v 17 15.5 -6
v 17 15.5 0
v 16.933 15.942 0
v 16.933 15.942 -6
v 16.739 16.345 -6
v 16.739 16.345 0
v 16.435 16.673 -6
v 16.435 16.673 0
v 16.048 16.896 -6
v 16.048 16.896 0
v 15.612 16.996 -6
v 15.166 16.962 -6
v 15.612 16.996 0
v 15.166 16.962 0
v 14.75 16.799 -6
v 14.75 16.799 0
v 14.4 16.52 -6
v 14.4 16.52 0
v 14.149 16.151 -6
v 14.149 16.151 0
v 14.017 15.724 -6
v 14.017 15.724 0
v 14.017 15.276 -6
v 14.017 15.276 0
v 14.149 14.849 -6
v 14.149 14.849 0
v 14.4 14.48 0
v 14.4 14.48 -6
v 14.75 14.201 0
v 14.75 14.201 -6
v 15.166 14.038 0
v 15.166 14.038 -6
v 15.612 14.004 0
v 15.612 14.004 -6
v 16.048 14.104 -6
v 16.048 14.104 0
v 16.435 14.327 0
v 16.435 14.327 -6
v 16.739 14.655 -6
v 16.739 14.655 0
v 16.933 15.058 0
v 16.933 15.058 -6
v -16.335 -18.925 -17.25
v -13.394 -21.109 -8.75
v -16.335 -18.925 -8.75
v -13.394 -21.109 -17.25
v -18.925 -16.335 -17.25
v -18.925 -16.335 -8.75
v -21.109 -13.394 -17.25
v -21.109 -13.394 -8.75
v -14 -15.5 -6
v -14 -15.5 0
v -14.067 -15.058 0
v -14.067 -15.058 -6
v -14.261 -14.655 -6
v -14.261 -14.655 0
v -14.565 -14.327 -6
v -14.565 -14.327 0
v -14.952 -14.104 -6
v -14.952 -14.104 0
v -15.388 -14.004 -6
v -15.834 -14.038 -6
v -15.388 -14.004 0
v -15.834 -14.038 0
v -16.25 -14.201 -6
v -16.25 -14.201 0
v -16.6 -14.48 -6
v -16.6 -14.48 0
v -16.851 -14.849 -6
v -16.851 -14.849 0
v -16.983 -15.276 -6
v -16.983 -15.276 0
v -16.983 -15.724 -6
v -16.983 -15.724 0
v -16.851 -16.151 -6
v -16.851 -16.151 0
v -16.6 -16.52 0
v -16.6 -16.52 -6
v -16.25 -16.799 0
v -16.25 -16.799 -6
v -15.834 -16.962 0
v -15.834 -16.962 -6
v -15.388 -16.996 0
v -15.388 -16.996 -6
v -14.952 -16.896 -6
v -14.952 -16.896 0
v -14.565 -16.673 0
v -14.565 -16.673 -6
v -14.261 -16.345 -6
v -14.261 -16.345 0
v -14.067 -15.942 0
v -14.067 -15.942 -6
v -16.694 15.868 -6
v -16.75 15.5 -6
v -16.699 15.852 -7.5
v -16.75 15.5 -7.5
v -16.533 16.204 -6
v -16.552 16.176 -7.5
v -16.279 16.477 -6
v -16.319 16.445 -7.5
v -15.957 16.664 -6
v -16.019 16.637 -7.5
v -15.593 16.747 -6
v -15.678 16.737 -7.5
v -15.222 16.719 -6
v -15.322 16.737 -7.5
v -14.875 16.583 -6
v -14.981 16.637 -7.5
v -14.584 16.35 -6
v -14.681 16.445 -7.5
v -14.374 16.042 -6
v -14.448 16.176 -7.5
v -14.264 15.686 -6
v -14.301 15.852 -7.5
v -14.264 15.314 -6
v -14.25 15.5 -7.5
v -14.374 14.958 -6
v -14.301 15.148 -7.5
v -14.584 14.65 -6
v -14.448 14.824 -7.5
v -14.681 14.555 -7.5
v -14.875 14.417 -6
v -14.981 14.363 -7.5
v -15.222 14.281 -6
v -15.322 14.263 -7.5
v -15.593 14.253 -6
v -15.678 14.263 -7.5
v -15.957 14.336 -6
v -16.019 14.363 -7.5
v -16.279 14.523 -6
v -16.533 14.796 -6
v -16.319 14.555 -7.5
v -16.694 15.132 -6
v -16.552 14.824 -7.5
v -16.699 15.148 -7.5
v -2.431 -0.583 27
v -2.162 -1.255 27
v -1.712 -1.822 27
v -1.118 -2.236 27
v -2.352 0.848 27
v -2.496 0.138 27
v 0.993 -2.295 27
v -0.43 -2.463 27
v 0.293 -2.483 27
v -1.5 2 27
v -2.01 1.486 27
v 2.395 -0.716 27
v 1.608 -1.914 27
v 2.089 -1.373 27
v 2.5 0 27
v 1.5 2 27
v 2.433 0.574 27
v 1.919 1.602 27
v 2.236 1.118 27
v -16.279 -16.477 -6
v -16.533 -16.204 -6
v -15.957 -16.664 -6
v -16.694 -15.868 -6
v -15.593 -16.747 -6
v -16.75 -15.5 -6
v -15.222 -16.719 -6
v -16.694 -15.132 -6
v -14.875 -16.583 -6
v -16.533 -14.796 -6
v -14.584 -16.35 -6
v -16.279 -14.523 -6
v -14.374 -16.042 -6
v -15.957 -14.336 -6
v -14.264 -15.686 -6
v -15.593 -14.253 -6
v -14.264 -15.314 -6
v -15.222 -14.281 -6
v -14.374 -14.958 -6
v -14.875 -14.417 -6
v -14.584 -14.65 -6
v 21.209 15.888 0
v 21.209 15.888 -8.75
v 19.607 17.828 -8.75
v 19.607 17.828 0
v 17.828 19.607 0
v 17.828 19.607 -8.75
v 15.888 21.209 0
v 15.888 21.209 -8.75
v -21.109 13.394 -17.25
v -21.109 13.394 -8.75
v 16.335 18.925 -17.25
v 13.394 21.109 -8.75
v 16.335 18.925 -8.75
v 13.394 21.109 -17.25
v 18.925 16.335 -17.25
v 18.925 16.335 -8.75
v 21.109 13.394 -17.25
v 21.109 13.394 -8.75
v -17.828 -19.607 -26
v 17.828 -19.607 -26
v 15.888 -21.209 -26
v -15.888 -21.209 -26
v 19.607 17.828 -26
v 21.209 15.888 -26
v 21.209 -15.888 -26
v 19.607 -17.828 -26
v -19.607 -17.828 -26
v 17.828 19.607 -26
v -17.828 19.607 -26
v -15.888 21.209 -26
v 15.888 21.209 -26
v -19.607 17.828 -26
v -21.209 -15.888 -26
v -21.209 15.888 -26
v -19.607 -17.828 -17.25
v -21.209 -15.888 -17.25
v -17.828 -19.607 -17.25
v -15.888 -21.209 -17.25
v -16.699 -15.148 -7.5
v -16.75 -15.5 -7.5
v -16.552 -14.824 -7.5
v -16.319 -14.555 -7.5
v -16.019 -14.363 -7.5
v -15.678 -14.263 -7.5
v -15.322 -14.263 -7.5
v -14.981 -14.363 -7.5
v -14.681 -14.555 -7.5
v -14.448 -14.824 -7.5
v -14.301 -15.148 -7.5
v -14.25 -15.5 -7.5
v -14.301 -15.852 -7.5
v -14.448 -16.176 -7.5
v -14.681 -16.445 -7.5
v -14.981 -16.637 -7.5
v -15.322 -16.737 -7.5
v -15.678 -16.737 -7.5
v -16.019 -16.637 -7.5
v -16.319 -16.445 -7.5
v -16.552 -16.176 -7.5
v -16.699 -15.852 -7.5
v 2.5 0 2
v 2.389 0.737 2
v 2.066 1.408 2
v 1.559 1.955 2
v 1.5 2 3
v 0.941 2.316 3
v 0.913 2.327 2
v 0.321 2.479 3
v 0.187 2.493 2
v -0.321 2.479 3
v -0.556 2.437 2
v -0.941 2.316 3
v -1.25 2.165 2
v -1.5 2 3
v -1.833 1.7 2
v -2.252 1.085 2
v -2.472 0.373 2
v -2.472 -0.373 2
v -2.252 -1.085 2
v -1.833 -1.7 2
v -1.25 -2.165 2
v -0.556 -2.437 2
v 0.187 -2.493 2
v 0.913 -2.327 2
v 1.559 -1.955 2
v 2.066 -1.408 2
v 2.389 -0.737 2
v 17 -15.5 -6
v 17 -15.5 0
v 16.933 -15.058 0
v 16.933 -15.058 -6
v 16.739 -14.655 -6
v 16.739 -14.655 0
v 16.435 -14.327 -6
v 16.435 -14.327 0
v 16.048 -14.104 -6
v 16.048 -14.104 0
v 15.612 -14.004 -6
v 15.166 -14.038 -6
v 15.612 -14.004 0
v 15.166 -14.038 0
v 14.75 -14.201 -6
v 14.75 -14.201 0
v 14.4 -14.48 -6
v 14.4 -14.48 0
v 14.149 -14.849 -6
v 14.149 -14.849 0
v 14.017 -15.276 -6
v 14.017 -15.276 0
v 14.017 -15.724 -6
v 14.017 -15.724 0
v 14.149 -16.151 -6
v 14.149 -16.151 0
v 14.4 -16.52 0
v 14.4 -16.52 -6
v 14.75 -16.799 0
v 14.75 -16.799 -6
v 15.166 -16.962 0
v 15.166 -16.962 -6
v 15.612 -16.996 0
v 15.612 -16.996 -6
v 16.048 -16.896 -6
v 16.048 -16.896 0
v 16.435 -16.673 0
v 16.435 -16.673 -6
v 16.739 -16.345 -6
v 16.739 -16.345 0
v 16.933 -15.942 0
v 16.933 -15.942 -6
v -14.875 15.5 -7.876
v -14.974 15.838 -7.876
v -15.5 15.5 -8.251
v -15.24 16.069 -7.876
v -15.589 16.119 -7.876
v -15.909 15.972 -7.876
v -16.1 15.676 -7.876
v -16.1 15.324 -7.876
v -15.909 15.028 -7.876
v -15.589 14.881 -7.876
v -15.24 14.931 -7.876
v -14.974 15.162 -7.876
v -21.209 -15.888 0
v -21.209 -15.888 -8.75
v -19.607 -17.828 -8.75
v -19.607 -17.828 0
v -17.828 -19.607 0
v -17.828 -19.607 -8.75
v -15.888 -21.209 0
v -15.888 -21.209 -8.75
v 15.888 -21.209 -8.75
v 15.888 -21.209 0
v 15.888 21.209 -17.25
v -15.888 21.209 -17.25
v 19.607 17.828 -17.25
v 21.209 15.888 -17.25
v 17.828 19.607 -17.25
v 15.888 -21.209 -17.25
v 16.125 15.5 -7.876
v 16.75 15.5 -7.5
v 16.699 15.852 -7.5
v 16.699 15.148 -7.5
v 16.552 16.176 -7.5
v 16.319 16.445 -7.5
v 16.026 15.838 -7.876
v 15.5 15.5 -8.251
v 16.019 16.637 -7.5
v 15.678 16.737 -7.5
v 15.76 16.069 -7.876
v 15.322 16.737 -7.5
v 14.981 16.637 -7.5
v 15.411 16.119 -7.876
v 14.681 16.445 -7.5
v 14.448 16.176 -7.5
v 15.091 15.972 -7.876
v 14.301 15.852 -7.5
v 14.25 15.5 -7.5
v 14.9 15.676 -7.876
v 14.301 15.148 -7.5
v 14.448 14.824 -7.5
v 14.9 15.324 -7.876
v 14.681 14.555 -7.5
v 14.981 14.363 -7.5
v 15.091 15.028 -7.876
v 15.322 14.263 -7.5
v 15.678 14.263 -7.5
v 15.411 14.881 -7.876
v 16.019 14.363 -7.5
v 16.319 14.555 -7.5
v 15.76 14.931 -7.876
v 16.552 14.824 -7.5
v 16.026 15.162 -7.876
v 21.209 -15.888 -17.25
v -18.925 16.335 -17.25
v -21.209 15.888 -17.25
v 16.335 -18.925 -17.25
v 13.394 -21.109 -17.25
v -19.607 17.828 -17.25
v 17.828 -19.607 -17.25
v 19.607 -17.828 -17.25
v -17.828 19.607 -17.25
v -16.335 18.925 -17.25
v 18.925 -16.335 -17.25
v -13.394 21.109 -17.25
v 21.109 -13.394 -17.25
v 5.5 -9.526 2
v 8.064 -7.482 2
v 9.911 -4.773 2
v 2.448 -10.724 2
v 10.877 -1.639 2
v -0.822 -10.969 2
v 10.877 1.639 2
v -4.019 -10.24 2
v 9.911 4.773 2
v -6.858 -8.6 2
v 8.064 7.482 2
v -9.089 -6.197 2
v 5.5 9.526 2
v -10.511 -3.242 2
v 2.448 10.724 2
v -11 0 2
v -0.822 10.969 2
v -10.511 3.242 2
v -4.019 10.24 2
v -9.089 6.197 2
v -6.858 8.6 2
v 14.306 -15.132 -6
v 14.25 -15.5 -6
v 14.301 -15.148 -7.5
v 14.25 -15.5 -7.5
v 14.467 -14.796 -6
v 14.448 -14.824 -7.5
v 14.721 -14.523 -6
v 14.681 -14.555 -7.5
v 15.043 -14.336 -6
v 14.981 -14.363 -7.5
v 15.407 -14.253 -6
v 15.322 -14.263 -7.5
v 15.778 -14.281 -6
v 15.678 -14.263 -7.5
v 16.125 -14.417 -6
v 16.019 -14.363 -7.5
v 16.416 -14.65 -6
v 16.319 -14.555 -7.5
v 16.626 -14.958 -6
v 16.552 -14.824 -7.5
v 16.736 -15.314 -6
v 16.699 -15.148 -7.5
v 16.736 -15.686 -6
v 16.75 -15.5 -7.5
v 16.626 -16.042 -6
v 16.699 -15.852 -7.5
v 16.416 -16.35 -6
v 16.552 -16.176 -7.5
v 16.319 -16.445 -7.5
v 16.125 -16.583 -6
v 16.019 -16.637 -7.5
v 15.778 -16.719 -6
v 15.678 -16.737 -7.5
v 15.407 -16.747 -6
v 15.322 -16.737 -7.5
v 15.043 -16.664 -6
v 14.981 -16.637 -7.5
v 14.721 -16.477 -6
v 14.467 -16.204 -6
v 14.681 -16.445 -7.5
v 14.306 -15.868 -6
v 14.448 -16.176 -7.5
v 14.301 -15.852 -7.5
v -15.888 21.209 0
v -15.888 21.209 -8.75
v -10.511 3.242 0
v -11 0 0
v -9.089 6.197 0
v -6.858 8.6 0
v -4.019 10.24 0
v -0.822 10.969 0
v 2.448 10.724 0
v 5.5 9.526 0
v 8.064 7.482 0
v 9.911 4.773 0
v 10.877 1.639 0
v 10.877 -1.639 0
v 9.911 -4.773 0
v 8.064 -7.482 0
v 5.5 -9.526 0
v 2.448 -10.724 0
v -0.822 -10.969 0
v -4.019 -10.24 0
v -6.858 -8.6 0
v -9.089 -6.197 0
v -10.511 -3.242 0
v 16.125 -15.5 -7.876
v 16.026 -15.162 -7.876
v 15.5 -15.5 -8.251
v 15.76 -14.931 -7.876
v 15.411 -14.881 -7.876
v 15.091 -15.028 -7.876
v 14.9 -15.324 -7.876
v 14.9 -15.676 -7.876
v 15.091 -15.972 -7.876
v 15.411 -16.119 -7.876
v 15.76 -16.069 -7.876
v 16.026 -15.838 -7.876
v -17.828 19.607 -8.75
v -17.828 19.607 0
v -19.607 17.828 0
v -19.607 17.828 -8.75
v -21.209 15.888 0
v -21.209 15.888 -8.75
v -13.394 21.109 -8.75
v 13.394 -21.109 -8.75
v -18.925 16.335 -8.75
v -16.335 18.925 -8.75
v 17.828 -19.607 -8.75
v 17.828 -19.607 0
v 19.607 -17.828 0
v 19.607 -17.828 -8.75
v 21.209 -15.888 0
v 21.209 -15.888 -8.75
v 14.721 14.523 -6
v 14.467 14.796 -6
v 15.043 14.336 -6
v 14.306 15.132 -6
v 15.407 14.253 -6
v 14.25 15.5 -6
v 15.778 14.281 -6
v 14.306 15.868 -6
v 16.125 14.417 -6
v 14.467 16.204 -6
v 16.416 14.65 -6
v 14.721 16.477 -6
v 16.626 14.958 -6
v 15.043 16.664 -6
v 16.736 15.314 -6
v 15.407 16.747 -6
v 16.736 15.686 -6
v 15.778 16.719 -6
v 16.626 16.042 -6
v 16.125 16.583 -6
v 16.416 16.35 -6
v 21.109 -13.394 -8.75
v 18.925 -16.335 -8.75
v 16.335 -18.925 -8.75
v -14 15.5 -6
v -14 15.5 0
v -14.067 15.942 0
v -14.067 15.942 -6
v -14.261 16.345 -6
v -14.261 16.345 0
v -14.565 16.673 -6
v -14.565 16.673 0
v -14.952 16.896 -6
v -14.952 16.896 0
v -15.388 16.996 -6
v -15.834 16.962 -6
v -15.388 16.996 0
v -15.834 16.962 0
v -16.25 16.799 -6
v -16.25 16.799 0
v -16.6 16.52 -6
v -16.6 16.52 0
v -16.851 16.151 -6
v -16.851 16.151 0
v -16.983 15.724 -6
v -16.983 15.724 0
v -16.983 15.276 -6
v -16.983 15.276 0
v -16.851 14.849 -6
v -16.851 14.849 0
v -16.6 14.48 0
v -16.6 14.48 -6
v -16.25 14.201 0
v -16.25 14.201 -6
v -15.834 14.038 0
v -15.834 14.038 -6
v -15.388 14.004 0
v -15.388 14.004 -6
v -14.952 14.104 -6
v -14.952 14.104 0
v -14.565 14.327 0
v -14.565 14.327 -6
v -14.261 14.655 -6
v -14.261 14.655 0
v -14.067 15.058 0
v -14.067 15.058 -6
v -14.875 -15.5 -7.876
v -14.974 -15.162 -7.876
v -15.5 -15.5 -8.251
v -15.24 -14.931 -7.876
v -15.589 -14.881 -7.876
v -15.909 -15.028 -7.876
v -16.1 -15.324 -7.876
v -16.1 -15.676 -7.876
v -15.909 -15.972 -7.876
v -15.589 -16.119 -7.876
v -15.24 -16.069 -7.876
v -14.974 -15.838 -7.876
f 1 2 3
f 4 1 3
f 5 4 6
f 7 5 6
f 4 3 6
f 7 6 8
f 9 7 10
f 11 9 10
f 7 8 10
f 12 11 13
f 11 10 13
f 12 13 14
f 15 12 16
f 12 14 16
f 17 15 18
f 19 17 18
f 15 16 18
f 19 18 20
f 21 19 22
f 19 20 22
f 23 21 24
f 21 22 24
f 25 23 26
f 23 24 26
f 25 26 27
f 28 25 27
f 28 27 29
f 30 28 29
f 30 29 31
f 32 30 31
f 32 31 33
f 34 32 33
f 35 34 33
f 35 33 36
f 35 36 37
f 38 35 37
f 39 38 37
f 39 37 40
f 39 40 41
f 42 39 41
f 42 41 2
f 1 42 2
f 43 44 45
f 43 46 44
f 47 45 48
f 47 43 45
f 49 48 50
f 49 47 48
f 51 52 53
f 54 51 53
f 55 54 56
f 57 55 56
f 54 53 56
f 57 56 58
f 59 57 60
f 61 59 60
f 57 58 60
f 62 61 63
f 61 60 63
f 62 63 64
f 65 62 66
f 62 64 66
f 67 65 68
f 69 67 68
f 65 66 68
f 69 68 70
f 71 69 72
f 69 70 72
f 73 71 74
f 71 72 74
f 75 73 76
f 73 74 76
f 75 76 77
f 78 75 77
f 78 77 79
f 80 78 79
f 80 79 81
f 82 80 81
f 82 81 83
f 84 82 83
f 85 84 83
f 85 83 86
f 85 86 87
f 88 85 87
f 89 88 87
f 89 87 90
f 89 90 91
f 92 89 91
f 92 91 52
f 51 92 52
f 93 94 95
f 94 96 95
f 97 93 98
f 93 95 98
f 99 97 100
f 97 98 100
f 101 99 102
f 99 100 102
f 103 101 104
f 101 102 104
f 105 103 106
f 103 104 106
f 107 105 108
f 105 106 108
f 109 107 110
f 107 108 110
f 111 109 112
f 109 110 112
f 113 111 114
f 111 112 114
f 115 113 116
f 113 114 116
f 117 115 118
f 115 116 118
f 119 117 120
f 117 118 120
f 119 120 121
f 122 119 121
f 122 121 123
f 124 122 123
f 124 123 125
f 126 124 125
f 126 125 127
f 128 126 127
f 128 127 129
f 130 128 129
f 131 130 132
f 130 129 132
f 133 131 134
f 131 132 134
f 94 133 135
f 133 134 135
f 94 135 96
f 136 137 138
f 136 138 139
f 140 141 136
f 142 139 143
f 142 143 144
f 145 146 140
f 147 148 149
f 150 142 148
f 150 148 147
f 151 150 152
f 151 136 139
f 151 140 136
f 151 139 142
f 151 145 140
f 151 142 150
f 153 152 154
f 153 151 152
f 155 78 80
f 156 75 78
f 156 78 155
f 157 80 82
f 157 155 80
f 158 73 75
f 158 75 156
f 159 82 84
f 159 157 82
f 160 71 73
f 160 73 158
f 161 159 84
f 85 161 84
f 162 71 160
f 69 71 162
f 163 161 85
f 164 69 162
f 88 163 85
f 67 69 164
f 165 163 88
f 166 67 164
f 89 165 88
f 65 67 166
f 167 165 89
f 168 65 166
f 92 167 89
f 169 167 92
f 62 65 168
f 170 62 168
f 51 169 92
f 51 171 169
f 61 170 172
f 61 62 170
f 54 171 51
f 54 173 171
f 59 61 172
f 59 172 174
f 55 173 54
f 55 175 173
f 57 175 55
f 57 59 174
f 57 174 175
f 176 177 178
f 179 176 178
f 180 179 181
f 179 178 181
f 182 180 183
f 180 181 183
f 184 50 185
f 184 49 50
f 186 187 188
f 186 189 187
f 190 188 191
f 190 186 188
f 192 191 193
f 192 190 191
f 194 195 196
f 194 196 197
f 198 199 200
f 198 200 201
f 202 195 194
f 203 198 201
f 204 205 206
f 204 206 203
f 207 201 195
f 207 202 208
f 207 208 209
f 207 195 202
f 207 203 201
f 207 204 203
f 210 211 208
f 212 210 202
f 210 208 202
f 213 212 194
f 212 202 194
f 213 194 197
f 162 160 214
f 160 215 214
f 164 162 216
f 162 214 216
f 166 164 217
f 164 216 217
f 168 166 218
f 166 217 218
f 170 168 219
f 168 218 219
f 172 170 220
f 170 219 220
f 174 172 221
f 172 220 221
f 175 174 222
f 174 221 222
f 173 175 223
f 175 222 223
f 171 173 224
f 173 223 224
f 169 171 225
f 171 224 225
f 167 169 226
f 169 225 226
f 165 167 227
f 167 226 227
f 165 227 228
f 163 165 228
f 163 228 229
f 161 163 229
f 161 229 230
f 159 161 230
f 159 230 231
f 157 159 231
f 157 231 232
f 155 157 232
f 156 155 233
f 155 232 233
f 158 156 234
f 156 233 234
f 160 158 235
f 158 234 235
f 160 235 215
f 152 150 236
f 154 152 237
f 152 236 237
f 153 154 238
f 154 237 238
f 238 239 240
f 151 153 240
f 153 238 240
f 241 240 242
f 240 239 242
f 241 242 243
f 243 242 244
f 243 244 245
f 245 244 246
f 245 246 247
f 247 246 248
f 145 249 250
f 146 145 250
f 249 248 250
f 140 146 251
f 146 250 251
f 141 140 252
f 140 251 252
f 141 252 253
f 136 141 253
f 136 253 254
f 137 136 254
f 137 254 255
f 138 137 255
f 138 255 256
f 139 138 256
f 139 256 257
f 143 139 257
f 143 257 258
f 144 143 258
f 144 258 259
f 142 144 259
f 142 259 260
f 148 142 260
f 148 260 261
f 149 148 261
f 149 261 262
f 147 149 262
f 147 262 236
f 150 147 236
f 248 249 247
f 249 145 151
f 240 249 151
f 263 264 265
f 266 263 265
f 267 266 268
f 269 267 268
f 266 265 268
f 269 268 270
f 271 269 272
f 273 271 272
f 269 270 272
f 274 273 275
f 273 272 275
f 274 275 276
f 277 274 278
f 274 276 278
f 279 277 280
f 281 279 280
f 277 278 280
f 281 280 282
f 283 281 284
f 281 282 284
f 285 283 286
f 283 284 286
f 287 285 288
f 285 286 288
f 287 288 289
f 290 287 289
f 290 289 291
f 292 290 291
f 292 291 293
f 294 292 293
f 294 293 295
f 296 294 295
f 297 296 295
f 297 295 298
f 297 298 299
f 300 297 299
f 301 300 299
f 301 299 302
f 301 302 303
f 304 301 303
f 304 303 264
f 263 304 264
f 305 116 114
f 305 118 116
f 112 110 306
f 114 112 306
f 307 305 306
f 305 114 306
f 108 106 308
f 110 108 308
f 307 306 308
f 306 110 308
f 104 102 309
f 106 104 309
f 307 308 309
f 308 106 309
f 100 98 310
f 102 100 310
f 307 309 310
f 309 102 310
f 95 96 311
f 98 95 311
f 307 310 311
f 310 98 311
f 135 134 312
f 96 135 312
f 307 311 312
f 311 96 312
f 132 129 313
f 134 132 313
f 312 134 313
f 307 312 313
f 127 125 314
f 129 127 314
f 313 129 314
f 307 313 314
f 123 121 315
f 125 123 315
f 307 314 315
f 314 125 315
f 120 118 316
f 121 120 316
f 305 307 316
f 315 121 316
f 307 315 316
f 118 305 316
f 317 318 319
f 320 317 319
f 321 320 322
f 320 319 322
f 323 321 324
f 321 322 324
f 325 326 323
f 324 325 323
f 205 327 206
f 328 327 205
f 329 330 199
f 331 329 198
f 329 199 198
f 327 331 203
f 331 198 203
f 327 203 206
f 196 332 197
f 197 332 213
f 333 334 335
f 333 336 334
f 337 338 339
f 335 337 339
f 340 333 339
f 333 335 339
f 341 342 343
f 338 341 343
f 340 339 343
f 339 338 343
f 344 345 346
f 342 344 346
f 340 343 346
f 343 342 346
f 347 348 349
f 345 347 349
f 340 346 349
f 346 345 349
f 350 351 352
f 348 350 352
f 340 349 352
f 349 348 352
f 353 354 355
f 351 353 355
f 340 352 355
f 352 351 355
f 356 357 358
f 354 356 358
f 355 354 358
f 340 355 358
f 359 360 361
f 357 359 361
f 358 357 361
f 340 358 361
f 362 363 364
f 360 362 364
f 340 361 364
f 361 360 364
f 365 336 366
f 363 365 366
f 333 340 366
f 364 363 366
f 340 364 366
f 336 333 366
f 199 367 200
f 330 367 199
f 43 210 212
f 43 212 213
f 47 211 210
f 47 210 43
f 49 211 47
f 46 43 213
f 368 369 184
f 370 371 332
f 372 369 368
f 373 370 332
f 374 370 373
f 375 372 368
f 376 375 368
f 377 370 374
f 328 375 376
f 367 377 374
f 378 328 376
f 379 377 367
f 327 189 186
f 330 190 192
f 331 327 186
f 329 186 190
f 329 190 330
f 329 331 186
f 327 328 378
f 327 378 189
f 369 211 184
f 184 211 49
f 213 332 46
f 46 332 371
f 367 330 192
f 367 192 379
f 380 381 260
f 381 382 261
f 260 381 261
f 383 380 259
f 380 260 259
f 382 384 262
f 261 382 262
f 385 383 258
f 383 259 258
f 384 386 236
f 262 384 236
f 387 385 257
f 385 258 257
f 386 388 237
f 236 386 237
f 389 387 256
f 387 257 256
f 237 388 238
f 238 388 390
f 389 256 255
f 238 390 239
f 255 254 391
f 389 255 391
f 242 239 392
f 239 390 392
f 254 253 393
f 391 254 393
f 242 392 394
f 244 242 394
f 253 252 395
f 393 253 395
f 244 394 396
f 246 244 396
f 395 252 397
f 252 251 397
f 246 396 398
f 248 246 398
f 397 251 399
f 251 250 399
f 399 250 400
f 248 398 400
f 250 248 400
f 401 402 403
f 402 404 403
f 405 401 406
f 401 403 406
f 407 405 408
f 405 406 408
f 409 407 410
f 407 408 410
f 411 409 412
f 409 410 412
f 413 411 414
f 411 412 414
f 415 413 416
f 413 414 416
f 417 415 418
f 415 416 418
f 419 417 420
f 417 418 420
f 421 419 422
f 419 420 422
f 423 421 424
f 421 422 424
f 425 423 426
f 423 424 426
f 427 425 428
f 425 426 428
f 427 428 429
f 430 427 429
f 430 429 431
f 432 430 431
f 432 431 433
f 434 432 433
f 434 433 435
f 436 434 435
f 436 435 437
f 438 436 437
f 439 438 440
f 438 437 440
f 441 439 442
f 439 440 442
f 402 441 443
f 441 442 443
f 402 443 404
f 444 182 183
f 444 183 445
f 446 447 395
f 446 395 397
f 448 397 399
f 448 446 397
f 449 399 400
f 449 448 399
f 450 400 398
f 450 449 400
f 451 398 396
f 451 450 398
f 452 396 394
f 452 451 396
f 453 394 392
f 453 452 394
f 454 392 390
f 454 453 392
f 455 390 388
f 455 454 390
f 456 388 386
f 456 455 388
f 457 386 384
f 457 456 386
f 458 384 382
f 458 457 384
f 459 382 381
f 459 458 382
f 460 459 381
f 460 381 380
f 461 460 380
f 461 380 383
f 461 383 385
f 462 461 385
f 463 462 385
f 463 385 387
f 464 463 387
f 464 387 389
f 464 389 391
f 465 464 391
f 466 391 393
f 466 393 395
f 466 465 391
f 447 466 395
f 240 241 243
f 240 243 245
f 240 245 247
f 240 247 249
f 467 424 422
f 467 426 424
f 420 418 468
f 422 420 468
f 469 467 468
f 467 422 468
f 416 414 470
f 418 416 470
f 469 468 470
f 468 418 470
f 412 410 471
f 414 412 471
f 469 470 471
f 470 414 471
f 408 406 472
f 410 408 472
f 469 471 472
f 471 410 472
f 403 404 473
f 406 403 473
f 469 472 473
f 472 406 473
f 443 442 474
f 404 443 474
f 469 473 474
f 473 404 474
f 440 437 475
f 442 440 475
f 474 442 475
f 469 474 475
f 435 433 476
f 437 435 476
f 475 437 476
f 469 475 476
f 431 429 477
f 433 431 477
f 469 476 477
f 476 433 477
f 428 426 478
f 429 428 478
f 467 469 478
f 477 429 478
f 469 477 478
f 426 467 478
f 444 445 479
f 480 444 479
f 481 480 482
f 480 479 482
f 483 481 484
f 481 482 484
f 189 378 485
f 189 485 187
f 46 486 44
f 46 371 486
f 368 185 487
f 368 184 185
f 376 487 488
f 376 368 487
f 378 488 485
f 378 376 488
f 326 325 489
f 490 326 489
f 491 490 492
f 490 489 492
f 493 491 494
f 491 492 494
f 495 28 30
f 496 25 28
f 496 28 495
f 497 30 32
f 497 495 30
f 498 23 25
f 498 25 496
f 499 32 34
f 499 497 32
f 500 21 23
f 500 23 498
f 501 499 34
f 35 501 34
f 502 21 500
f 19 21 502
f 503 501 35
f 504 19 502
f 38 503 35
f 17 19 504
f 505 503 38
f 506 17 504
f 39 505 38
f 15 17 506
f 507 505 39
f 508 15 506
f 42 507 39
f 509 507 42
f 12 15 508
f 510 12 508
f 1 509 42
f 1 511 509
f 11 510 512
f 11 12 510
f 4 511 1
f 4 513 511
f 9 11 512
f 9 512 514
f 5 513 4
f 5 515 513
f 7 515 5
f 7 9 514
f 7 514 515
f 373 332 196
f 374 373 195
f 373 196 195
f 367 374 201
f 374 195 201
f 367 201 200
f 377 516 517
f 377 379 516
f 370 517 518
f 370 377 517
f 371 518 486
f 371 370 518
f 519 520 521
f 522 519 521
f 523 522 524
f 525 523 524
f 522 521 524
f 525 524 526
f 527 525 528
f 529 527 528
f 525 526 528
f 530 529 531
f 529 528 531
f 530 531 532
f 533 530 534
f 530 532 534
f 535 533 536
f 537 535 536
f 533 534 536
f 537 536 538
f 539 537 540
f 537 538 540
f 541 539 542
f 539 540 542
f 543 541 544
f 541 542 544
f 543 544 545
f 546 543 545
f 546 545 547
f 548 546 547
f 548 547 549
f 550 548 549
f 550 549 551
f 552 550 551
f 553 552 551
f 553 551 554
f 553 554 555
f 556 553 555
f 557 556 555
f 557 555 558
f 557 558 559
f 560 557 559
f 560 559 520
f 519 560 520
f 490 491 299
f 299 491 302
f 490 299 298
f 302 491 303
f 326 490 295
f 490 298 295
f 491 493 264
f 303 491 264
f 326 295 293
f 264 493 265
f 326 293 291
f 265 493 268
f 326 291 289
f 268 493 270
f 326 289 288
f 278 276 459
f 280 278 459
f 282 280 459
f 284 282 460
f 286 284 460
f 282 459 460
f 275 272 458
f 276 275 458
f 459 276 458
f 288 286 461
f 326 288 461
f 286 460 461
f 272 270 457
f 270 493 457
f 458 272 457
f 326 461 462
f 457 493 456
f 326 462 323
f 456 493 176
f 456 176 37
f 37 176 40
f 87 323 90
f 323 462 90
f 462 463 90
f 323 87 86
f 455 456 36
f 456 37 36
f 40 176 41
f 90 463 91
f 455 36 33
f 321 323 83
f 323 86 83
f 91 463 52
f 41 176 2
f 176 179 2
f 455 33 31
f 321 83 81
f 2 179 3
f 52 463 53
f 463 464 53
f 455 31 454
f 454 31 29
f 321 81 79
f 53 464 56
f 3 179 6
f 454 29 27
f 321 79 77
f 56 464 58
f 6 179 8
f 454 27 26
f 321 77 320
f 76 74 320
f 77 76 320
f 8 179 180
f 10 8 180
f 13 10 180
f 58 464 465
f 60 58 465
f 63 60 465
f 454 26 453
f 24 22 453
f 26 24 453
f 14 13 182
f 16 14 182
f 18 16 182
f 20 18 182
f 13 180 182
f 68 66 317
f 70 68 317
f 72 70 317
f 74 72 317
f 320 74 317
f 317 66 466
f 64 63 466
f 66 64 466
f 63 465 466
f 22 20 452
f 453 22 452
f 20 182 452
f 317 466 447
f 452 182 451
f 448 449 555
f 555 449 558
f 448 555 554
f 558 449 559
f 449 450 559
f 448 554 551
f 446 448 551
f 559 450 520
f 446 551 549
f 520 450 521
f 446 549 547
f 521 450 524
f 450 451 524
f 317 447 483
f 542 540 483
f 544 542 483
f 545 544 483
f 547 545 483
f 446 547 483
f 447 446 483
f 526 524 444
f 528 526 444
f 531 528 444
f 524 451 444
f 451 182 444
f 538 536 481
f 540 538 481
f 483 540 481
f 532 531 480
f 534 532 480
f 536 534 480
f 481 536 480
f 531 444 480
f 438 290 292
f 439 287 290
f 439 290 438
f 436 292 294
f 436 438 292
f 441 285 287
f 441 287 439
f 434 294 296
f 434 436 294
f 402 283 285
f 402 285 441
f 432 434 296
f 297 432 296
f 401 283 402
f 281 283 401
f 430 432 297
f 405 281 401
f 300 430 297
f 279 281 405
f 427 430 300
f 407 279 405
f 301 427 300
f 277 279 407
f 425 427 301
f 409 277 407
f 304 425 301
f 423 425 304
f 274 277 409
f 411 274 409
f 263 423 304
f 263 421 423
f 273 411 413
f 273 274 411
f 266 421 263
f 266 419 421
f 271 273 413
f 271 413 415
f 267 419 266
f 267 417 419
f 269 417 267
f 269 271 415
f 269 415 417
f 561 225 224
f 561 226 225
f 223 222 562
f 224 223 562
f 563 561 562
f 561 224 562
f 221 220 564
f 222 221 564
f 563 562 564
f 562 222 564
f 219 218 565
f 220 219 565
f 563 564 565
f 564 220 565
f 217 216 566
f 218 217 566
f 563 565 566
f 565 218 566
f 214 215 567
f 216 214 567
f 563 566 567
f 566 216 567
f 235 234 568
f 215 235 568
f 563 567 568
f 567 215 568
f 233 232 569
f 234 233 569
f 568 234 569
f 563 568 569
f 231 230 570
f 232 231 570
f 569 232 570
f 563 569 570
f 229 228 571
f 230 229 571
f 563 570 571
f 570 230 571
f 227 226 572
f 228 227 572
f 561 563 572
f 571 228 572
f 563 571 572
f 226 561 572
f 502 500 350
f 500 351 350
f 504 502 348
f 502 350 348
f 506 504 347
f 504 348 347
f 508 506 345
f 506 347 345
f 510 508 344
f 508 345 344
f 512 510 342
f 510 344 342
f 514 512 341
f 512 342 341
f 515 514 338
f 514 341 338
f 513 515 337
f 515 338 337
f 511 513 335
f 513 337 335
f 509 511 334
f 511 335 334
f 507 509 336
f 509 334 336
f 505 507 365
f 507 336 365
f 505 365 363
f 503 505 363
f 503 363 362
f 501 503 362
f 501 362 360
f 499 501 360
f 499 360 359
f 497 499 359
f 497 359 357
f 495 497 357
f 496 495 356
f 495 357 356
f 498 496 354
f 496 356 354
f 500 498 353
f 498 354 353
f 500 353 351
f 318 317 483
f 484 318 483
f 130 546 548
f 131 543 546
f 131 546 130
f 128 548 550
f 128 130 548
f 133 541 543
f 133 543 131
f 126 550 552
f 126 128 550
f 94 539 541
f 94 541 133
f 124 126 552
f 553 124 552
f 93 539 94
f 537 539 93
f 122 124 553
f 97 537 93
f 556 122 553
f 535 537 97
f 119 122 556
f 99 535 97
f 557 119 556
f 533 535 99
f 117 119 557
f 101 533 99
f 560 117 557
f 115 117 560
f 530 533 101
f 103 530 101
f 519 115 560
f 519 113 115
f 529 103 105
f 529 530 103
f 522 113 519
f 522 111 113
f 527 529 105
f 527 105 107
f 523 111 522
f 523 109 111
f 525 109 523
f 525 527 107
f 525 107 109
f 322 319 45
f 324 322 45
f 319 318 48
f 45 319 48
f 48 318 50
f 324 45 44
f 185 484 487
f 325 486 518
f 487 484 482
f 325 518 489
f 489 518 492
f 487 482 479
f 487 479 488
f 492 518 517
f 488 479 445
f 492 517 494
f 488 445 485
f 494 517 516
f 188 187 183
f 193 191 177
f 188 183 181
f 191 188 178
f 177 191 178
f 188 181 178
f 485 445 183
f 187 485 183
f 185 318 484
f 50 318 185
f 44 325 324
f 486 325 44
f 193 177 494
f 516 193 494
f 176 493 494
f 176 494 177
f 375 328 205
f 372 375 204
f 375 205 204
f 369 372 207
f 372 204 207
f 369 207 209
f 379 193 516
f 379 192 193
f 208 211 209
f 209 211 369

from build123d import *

# Parameters (mm, degrees)
SKETCH1_R                       = 2.5
BOSS_EXTRUDE1_DEPTH             = 27
SKETCH2_R                       = 11
BOSS_EXTRUDE2_DEPTH             = 2
SKETCH3_W                       = 42.418
SKETCH3_H                       = 42.418
BOSS_EXTRUDE3_DEPTH             = 26
CUT_EXTRUDE1_DEPTH              = 54
M3X0_5_TAPPED_HOLE1_D           = 2.5
M3X0_5_TAPPED_HOLE1_DEPTH       = 7.5
M3X0_5_TAPPED_HOLE1_CBORE_D     = 3
M3X0_5_TAPPED_HOLE1_CBORE_DEPTH = 6
M3X0_5_TAPPED_HOLE1_TIP         = 0.751075774
CUT_EXTRUDE2_DEPTH              = 24
CUT_EXTRUDE3_DEPTH              = 4.25
CUT_EXTRUDE3_DEPTH_BACK         = 4.25


with BuildPart() as part:
    # Sketch1 → Boss-Extrude1 (new body)
    with BuildSketch(Plane.XY):
        Circle(SKETCH1_R)
    extrude(amount=BOSS_EXTRUDE1_DEPTH)

    # Sketch2 → Boss-Extrude2 (add)
    with BuildSketch(Plane(origin=(0, 0, 0), x_dir=(-1, 0, 0), z_dir=(0, 0, -1))):
        Circle(SKETCH2_R)
    extrude(amount=-BOSS_EXTRUDE2_DEPTH)

    # Sketch3 → Boss-Extrude3 (add)
    with BuildSketch(Plane(origin=(0, 0, 0), x_dir=(-1, 0, 0), z_dir=(0, 0, -1))):
        Rectangle(SKETCH3_W, SKETCH3_H)
    extrude(amount=BOSS_EXTRUDE3_DEPTH)

    # Sketch4 → Cut-Extrude1 (cut, through all)
    with BuildSketch(Plane(origin=(0, 0, -26), x_dir=(-1, 0, 0), z_dir=(0, 0, -1))):
        with BuildLine():
            Line((-21.209, -15.887992919), (-21.209, -21.209))
            Line((-21.209, -21.209), (-15.887992919, -21.209))
            ThreePointArc((-15.887992919, -21.209), (-18.738329701, -18.738329701), (-21.209, -15.887992919))
        make_face()
        with BuildLine():
            Line((15.887992919, -21.209), (21.209, -21.209))
            Line((21.209, -21.209), (21.209, -15.887992919))
            ThreePointArc((21.209, -15.887992919), (18.738329701, -18.738329701), (15.887992919, -21.209))
        make_face()
        with BuildLine():
            Line((21.209, 15.887992919), (21.209, 21.209))
            Line((21.209, 21.209), (15.887992919, 21.209))
            ThreePointArc((15.887992919, 21.209), (18.738329701, 18.738329701), (21.209, 15.887992919))
        make_face()
        with BuildLine():
            Line((-15.887992919, 21.209), (-21.209, 21.209))
            Line((-21.209, 21.209), (-21.209, 15.887992919))
            ThreePointArc((-21.209, 15.887992919), (-18.738329701, 18.738329701), (-15.887992919, 21.209))
        make_face()
    extrude(amount=-CUT_EXTRUDE1_DEPTH, mode=Mode.SUBTRACT)

    # M3x0.5 Tapped Hole1
    with Locations(Plane.XY):
        with Locations((-15.5, 15.5), (-15.5, -15.5), (15.5, -15.5), (15.5, 15.5)):
            CounterBoreHole(M3X0_5_TAPPED_HOLE1_D / 2, M3X0_5_TAPPED_HOLE1_CBORE_D / 2, M3X0_5_TAPPED_HOLE1_CBORE_DEPTH, depth=M3X0_5_TAPPED_HOLE1_DEPTH)
            with Locations((0, 0, -(M3X0_5_TAPPED_HOLE1_DEPTH + M3X0_5_TAPPED_HOLE1_TIP / 2))):  # 118° drill point
                Cone(0, M3X0_5_TAPPED_HOLE1_D / 2, M3X0_5_TAPPED_HOLE1_TIP, mode=Mode.SUBTRACT)

    # Sketch7 → Cut-Extrude2 (cut)
    with BuildSketch(Plane.XY.offset(27)):
        with BuildLine():
            Line((-1.5, 2), (1.5, 2))
            ThreePointArc((1.5, 2), (0, 2.5), (-1.5, 2))
        make_face()
    extrude(amount=-CUT_EXTRUDE2_DEPTH, mode=Mode.SUBTRACT)

    # Sketch8 → Cut-Extrude3 (cut, two sides)
    with BuildSketch(Plane.XY.offset(-13)) as cut_extrude3_sk:
        with BuildLine():
            Line((15.887992919, 21.209), (-15.887992919, 21.209))
            ThreePointArc((-15.887992919, 21.209), (-18.738329701, 18.738329701), (-21.209, 15.887992919))
            Line((-21.209, 15.887992919), (-21.209, -15.887992919))
            ThreePointArc((-21.209, -15.887992919), (-18.738329701, -18.738329701), (-15.887992919, -21.209))
            Line((-15.887992919, -21.209), (15.887992919, -21.209))
            ThreePointArc((15.887992919, -21.209), (18.738329701, -18.738329701), (21.209, -15.887992919))
            Line((21.209, -15.887992919), (21.209, 15.887992919))
            ThreePointArc((21.209, 15.887992919), (18.738329701, 18.738329701), (15.887992919, 21.209))
        make_face()
        with BuildLine():
            Line((-13.394406258, 21.109), (13.394406258, 21.109))
            ThreePointArc((13.394406258, 21.109), (17.67766953, 17.67766953), (21.109, 13.394406258))
            Line((21.109, 13.394406258), (21.109, -13.394406258))
            ThreePointArc((21.109, -13.394406258), (17.67766953, -17.67766953), (13.394406258, -21.109))
            Line((13.394406258, -21.109), (-13.394406258, -21.109))
            ThreePointArc((-13.394406258, -21.109), (-17.67766953, -17.67766953), (-21.109, -13.394406258))
            Line((-21.109, -13.394406258), (-21.109, 13.394406258))
            ThreePointArc((-21.109, 13.394406258), (-17.67766953, 17.67766953), (-13.394406258, 21.109))
        make_face(mode=Mode.SUBTRACT)
    extrude(amount=CUT_EXTRUDE3_DEPTH, mode=Mode.SUBTRACT)
    extrude(cut_extrude3_sk.sketch, amount=-CUT_EXTRUDE3_DEPTH_BACK, mode=Mode.SUBTRACT)


solid = part.part
